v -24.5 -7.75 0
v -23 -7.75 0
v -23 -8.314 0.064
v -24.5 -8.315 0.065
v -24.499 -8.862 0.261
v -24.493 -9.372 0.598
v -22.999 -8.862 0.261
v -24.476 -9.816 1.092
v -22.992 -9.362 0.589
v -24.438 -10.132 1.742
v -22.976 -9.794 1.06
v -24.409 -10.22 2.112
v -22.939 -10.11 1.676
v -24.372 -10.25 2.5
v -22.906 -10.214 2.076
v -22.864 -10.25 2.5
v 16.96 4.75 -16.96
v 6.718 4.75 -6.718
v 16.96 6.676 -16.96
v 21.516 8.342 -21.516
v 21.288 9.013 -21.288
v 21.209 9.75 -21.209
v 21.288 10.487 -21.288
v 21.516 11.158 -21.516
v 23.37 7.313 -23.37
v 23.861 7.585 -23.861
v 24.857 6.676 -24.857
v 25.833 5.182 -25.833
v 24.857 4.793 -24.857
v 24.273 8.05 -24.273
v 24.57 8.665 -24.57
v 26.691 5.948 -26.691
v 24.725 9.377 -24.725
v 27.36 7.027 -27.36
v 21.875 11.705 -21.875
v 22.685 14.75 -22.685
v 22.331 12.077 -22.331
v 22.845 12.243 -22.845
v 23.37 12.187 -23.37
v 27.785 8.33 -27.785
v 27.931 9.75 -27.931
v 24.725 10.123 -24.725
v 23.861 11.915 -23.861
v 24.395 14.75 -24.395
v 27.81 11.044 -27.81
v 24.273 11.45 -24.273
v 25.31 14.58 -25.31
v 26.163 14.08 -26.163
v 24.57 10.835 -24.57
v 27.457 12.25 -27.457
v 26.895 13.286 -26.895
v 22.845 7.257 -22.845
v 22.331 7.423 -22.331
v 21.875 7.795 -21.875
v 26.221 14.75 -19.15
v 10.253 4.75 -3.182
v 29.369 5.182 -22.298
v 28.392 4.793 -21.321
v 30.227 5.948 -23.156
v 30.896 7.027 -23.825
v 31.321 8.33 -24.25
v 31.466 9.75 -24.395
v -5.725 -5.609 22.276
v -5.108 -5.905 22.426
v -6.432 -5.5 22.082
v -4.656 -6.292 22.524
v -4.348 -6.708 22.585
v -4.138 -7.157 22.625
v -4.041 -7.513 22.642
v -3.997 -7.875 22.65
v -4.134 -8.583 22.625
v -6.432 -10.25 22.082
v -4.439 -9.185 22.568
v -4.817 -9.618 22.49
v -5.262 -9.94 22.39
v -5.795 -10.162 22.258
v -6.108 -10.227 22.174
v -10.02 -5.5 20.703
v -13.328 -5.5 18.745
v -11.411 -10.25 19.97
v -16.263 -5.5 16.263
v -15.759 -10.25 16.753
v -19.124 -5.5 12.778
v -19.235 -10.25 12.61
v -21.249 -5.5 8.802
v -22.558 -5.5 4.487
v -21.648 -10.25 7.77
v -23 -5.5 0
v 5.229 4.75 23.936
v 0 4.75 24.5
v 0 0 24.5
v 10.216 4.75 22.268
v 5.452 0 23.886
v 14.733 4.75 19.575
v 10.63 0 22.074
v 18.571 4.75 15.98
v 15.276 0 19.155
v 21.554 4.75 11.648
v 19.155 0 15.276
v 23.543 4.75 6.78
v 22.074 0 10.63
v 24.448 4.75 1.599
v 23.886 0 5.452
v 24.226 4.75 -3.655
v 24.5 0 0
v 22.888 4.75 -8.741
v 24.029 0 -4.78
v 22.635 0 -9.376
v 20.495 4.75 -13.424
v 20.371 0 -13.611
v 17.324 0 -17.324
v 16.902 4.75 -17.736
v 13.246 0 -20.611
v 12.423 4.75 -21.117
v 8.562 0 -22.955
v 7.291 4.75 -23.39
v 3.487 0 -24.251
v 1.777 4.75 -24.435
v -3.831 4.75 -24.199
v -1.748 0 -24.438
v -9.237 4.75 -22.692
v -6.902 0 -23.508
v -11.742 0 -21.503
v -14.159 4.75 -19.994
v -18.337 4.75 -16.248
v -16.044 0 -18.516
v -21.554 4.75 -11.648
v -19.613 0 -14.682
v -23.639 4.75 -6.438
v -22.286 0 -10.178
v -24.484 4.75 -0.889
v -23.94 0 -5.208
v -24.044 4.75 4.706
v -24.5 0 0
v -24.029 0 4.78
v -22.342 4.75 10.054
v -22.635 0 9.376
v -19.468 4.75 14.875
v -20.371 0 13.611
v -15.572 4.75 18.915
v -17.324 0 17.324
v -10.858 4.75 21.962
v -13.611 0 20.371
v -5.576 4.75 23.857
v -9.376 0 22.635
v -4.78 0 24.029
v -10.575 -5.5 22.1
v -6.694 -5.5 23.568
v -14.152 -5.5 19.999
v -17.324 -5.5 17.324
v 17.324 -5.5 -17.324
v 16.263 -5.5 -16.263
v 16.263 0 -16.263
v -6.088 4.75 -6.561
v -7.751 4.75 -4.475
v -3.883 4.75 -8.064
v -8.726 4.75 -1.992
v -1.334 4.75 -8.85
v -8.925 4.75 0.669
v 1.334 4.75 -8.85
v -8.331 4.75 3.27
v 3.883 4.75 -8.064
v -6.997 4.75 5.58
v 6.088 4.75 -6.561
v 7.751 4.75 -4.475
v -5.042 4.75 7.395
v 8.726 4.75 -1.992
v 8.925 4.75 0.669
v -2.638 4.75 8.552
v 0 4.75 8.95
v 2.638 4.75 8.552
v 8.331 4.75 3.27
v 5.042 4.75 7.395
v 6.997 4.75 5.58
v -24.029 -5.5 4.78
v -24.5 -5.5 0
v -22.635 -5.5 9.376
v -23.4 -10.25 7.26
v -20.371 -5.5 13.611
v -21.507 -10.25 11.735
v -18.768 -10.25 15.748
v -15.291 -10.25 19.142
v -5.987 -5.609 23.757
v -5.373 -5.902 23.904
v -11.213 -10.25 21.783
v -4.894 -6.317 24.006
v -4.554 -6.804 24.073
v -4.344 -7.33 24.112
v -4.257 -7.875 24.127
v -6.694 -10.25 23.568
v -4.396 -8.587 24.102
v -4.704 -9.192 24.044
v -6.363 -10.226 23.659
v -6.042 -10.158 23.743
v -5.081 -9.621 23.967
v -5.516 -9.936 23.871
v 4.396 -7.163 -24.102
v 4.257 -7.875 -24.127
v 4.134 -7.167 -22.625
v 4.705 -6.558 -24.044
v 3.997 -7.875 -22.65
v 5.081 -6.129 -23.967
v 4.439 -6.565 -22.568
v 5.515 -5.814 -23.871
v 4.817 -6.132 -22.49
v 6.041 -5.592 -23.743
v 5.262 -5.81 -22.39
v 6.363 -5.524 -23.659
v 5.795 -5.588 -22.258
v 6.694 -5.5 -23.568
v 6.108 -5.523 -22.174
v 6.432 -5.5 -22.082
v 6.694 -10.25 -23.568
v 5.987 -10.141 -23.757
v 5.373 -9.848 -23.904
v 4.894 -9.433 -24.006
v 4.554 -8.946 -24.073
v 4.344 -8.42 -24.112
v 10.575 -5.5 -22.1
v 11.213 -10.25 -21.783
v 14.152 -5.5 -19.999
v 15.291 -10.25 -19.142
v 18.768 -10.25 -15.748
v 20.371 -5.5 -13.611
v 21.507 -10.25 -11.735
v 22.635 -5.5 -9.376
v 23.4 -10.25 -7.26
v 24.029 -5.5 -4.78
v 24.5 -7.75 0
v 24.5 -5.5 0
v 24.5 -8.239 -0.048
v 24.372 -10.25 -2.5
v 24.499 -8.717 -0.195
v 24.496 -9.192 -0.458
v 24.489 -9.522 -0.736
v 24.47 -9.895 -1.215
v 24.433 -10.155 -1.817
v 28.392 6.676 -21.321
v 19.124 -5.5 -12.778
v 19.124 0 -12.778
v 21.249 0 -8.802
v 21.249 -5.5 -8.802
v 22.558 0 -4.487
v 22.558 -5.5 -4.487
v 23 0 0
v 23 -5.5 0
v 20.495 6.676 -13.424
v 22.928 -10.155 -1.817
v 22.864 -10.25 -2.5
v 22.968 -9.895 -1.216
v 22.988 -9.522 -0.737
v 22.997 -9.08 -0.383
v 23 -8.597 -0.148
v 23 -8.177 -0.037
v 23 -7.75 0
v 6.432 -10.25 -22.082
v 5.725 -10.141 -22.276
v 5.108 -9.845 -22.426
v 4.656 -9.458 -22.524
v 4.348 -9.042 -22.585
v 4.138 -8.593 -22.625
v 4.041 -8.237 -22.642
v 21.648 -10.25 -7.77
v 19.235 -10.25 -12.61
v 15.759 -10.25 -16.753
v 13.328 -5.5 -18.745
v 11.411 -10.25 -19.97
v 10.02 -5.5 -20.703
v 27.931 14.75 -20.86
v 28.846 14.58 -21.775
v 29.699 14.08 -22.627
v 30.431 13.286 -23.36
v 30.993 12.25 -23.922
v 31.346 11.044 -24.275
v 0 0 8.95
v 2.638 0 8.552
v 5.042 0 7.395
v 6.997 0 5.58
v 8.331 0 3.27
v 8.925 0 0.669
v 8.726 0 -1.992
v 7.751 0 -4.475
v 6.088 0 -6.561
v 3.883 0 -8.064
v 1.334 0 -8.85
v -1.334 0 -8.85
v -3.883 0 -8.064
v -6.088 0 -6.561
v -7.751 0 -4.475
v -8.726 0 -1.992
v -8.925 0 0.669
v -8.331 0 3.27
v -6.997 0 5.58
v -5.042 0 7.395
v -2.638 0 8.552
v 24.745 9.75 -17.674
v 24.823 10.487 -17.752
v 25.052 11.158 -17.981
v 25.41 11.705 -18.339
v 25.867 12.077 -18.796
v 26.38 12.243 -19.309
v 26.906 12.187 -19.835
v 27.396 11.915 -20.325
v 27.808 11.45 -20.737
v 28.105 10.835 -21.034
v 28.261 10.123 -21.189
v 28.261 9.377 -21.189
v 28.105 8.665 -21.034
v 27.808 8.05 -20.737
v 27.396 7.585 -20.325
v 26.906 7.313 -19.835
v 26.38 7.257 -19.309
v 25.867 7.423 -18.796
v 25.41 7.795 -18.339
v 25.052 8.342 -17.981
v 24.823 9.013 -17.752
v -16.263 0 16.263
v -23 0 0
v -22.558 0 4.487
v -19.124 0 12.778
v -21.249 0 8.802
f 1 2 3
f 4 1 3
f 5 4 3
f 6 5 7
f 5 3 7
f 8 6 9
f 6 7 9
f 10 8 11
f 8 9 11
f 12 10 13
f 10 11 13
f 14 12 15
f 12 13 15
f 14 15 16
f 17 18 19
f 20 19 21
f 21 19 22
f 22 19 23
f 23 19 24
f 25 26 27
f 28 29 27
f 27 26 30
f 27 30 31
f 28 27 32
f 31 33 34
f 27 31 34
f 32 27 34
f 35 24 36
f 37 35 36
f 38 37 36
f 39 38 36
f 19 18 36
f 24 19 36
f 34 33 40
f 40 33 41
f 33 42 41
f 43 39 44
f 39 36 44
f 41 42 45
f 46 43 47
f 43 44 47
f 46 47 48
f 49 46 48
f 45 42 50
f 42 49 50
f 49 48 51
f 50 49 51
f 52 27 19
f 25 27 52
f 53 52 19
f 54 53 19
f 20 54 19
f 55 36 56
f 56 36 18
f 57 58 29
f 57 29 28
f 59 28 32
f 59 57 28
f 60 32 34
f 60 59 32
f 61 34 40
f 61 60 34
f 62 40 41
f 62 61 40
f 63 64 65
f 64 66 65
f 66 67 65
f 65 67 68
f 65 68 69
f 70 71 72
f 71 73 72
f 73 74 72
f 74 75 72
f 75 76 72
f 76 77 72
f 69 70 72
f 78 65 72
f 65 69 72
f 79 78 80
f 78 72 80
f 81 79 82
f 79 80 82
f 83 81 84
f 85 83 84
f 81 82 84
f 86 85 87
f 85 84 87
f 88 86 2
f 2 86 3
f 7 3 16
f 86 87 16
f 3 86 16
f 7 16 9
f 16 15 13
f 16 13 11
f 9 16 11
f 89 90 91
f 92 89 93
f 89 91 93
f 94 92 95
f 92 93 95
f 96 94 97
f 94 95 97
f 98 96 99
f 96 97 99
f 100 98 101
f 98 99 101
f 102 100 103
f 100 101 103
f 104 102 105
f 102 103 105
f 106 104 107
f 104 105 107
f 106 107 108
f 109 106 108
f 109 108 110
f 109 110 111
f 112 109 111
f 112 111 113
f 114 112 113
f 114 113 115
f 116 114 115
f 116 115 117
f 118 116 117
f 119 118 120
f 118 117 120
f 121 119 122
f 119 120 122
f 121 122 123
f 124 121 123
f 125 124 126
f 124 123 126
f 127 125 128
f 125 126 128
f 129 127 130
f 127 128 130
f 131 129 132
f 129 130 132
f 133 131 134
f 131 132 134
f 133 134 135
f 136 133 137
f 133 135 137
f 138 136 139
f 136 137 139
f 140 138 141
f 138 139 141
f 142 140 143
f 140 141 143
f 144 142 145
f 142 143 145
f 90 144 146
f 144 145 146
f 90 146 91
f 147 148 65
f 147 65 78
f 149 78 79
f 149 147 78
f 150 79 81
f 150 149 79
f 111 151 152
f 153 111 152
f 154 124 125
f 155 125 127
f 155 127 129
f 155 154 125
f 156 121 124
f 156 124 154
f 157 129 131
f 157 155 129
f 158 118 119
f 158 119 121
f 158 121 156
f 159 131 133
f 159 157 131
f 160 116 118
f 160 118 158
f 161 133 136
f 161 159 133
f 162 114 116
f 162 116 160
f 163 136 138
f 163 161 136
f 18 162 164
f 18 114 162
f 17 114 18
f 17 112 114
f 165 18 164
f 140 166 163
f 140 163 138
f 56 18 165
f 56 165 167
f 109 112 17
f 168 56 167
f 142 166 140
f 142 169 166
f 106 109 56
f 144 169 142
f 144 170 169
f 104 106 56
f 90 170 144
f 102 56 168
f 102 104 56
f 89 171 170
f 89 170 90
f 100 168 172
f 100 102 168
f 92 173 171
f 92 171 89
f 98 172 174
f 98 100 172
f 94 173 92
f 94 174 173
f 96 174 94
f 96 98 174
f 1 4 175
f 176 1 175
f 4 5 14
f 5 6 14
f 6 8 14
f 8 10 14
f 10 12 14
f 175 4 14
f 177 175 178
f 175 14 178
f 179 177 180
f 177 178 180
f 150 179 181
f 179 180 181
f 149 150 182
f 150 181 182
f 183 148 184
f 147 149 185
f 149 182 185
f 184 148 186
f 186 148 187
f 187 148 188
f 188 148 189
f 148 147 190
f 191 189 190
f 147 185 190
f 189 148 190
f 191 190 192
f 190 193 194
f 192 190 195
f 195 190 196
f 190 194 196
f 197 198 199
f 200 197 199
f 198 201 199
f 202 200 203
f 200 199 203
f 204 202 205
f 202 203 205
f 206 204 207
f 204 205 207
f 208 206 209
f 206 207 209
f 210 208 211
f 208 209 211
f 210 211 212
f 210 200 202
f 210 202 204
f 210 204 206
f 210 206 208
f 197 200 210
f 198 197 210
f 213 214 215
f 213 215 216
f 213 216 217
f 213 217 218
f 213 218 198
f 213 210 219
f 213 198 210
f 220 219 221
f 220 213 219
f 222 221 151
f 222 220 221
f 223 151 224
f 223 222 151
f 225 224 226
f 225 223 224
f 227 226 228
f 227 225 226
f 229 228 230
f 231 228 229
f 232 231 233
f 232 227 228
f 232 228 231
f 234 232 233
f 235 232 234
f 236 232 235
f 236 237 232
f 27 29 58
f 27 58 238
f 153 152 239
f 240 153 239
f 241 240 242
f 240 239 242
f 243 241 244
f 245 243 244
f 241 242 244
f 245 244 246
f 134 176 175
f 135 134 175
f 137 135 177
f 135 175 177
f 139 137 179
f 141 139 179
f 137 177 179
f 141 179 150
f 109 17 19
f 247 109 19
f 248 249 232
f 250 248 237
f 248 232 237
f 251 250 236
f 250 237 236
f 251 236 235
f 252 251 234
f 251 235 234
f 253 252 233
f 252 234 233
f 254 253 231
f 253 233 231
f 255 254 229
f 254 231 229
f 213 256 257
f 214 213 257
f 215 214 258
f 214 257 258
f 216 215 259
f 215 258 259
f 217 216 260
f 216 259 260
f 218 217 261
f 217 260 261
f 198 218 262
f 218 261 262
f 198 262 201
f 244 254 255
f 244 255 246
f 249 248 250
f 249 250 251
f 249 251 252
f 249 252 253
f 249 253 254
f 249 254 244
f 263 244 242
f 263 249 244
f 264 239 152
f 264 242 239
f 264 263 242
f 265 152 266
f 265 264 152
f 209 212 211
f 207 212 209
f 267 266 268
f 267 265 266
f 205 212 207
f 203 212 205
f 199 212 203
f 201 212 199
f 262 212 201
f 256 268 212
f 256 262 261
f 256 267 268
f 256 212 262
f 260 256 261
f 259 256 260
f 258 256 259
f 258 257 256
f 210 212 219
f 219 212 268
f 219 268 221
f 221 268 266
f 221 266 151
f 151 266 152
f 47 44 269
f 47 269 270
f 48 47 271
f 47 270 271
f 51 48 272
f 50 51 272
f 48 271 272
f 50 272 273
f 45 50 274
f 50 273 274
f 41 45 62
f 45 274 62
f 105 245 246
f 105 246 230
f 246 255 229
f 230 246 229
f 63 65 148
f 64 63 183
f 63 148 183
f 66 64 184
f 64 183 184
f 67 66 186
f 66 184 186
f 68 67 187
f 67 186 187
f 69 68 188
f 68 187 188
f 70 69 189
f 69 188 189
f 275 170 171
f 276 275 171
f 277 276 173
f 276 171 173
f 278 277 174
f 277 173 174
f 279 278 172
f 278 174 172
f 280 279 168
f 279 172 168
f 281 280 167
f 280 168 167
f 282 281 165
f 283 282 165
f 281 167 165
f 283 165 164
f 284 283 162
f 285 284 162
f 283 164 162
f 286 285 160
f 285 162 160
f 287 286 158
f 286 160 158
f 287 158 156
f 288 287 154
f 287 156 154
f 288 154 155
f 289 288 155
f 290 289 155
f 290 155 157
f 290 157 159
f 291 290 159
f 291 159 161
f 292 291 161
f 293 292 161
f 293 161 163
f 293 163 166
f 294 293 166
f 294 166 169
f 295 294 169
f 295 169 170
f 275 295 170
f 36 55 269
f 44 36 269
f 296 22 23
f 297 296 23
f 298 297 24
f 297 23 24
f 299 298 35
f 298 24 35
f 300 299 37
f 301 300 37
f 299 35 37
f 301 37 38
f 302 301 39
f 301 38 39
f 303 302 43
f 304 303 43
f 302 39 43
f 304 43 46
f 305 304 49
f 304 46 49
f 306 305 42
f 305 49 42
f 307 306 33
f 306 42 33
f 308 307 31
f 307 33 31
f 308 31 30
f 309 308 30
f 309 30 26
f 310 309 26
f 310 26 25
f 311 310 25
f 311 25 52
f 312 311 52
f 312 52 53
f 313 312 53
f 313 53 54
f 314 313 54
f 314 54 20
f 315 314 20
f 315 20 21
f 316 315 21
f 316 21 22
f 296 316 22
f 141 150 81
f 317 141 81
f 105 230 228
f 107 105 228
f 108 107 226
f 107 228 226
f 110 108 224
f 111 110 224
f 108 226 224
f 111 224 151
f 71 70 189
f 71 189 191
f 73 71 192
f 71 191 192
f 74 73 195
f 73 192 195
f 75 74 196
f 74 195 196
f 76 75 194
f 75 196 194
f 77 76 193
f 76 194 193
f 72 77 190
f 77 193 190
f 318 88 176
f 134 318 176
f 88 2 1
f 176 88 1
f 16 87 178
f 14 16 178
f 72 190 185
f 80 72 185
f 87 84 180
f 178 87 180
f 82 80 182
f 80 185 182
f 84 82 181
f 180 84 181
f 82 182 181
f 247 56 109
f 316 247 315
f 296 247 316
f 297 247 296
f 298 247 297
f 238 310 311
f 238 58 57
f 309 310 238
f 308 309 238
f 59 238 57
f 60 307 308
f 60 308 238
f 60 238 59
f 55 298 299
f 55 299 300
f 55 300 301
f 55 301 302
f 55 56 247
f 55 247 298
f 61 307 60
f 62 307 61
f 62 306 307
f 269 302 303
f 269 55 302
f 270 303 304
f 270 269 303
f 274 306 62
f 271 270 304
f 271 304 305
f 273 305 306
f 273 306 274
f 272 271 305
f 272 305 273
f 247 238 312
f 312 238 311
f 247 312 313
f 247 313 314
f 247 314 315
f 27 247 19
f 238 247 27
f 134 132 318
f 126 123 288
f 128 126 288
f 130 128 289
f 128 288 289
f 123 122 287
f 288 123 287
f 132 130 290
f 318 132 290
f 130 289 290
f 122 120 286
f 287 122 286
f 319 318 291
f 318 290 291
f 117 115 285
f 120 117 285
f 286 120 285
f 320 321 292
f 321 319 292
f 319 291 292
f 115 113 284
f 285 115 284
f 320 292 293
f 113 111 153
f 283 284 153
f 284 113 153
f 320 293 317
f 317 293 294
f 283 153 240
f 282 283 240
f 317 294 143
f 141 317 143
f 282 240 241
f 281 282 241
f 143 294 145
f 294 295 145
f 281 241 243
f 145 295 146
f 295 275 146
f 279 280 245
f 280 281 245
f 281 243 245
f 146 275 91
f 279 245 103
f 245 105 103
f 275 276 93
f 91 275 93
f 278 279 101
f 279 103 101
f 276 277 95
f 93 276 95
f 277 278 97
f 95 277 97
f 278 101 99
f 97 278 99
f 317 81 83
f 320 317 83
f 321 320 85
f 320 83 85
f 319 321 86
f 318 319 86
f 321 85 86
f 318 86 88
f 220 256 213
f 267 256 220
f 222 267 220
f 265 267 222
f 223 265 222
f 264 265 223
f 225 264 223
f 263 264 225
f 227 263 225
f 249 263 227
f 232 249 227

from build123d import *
from build123d.topology import SkipClean

# Parameters (mm, degrees)
SKETCH_1_R          = 24.5
EXTRUDE_1_DEPTH     = 4.75
EXTRUDE_START       = 5.5
EXTRUDE_2_DEPTH     = 5.5
EXTRUDE_START_2     = 4.75
EXTRUDE_3_DEPTH     = 4.75
SKETCH_6_R          = 8.95
CUT_EXTRUDE_1_DEPTH = 38.755794257
SKETCH_8_W          = 30
SKETCH_8_H          = 10
EXTRUDE_4_DEPTH     = 5
FILLET_1_R          = 10
FILLET_2_R          = 5
MM_1_D              = 5
SKETCH_11_W         = 11.168523271
SKETCH_11_H         = 1.926491066
CUT_EXTRUDE_2_DEPTH = 45.650628903
CUT_EXTRUDE_3_DEPTH = 45.584890939
FILLET_3_R          = 2.5


# Some blends are built 0.0001 mm under size
with BuildPart() as part:
    # 草图1 → 凸台-拉伸1 (new body)
    with BuildSketch(Plane(origin=(0, 0, 0), x_dir=(1, 0, 0), z_dir=(0, 1, 0))):
        with Locations(Location((0, 0, 0), (0, 0, 270))):
            Circle(SKETCH_1_R)
    extrude(amount=EXTRUDE_1_DEPTH)

    # 草图4 → 凸台-拉伸2 (add)
    with BuildSketch(Plane.XZ.offset(EXTRUDE_START)):
        with BuildLine():
            Line((-23, 0), (-24.5, 0))
            ThreePointArc((-24.5, 0), (-22.635048547, 9.375744093), (-17.324116139, 17.324116139))
            Line((-17.324116139, 17.324116139), (-16.263455967, 16.263455967))
            ThreePointArc((-16.263455967, 16.263455967), (-21.249229248, 8.801718944), (-23, 0))
        make_face()
        with BuildLine():
            Line((23, 0), (24.5, 0))
            ThreePointArc((24.5, 0), (22.635048547, -9.375744093), (17.324116139, -17.324116139))
            Line((17.324116139, -17.324116139), (16.263455967, -16.263455967))
            ThreePointArc((16.263455967, -16.263455967), (21.249229248, -8.801718944), (23, 0))
        make_face()
    extrude(amount=-EXTRUDE_2_DEPTH)

    # 草图5 → 凸台-拉伸3 (add)
    with SkipClean():  # the faces are left unmerged after this step: merging them gives an invalid solid
        with BuildSketch(Plane.XZ.offset(5.5).offset(EXTRUDE_START_2)):
            with BuildLine():
                Line((-23, 0), (-24.5, 0))
                ThreePointArc((-24.5, 0), (-18.768088856, 15.748296437), (-4.254380353, 24.127789949))
                Line((-4.254380353, 24.127789949), (-3.993908086, 22.650578319))
                ThreePointArc((-3.993908086, 22.650578319), (-17.619022192, 14.784115023), (-23, 0))
            make_face()
            with BuildLine():
                Line((3.993908086, -22.650578319), (4.254380353, -24.127789949))
                ThreePointArc((4.254380353, -24.127789949), (18.768088856, -15.748296437), (24.5, 0))
                Line((24.5, 0), (23, 0))
                ThreePointArc((23, 0), (17.619022192, -14.784115023), (3.993908086, -22.650578319))
            make_face()
        extrude(amount=-EXTRUDE_3_DEPTH)

    # 草图6 → 切除-拉伸1 (cut, through all)
    with SkipClean():  # the faces are left unmerged after this step: merging them gives an invalid solid
        with BuildSketch(Plane(origin=(0, 4.75, 0), x_dir=(1, 0, 0), z_dir=(0, 1, 0))):
            with Locations(Location((0, 0, 0), (0, 0, 270))):
                Circle(SKETCH_6_R)
        extrude(amount=-CUT_EXTRUDE_1_DEPTH, mode=Mode.SUBTRACT)

    # 草图8 → 凸台-拉伸4 (add)
    with SkipClean():  # the faces are left unmerged after this step: merging them gives an invalid solid
        with BuildSketch(Plane(origin=(0, 0, 0), x_dir=(0.7071067811865489, 0, -0.7071067811865462), z_dir=(0.7071067811865462, 0, 0.7071067811865489))):
            with Locations((24.5, 9.75)):
                Rectangle(SKETCH_8_W, SKETCH_8_H)
        extrude(amount=EXTRUDE_4_DEPTH)

    # 圆角1
    fillet_1_edges = [part.edges().sort_by_distance(p)[0] for p in [
        (8.485281374, 14.75, -4.949747468),
    ]]
    fillet(fillet_1_edges, radius=FILLET_1_R - 0.0001)  # a hair under: the kernel refuses the full size

    # 圆角2
    fillet_2_edges = [part.edges().sort_by_distance(p)[0] for p in [
        (29.69848481, 14.75, -26.162950904),
        (29.69848481, 4.75, -26.162950904),
    ]]
    fillet(fillet_2_edges, radius=FILLET_2_R - 0.0001)  # a hair under: the kernel refuses the full size

    # 大小mm 暗销孔1 (through all)
    with Locations(Plane(origin=(3.535533906, 0, 3.535533906), x_dir=(0.7071067811865488, 0, -0.7071067811865462), z_dir=(0.7071067811865462, 0, 0.7071067811865488))):
        with Locations((32.49436991, 9.75)):
            Hole(MM_1_D / 2)

    # 草图11 → 切除-拉伸2 (cut, through all)
    with BuildSketch(Plane(origin=(3.535533906, 0, 3.535533906), x_dir=(0.7071067811865489, 0, -0.7071067811865461), z_dir=(0.7071067811865461, 0, 0.7071067811865489))):
        with Locations((29.568631546, 5.713245533)):
            Rectangle(SKETCH_11_W, SKETCH_11_H)
    extrude(amount=-CUT_EXTRUDE_2_DEPTH, mode=Mode.SUBTRACT)

    # 草图12 → 切除-拉伸3 (cut, through all)
    with BuildSketch(Plane(origin=(0, 0, 0), x_dir=(-0.7071067811865489, 0, 0.7071067811865461), z_dir=(-0.7071067811865461, 0, -0.7071067811865489))):
        with BuildLine():
            Line((-32.081510731, 14.75), (-9.5, 4.75))
            ThreePointArc((-9.5, 4.75), (-12.428932188, 11.821067812), (-19.5, 14.75))
            Line((-19.5, 14.75), (-32.081510731, 14.75))
        make_face()
    extrude(amount=-CUT_EXTRUDE_3_DEPTH, mode=Mode.SUBTRACT)


with BuildPart() as cut_extrude_3_kept_piece:
    # of the separate pieces the step leaves, the one the design keeps (cut_extrude_3_pieces_kept)
    add(part.part.solids().sort_by_distance((24.395254662, 14.75, -24.395254662))[0])

    # 圆角3
    # the kernel refuses this fillet: 2.5 mm, written as the material it takes off along each edge
    with BuildSketch(Plane(origin=(-16.75, -10.25, 0), x_dir=(0, 1, 0), z_dir=(-1, 0, 0)), Plane(origin=(2.908606976, -10.25, -16.495529863), x_dir=(0.9848077530122085, 0, 0.17364817766692725), z_dir=(0.17364817766692725, 0, -0.9848077530122086)), Plane(origin=(30.75, -10.25, 0), x_dir=(0, 0, -1), z_dir=(-1, 0, 0))) as fillet_3_piece_1:
        with BuildLine():
            CenterArc((FILLET_3_R, -FILLET_3_R), FILLET_3_R, 90, 90)
            Line((0, -FILLET_3_R), (0, 0))
            Line((0, 0), (FILLET_3_R, 0))
        make_face()
    extrude(amount=14, mode=Mode.SUBTRACT)
    with BuildSketch(Plane(origin=(2.908606976, -5.5, -16.495529863), x_dir=(0.9848077530122085, 0, 0.17364817766692725), z_dir=(0.17364817766692725, 0, -0.9848077530122086)), Plane(origin=(-5.339681463, -5.5, 30.282838405), x_dir=(0, -1, 0), z_dir=(0.17364817766692875, 0, -0.9848077530122084)), Plane(origin=(-5.339681463, -10.25, 30.282838405), x_dir=(-0.9848077530122084, 0, -0.17364817766692872), z_dir=(0.17364817766692875, 0, -0.9848077530122084))) as fillet_3_piece_2:
        with BuildLine():
            CenterArc((FILLET_3_R, FILLET_3_R), FILLET_3_R, 180, 90)
            Line((0, FILLET_3_R), (0, 0))
            Line((0, 0), (FILLET_3_R, 0))
        make_face()
    extrude(amount=14, mode=Mode.SUBTRACT)


solid = cut_extrude_3_kept_piece.part
